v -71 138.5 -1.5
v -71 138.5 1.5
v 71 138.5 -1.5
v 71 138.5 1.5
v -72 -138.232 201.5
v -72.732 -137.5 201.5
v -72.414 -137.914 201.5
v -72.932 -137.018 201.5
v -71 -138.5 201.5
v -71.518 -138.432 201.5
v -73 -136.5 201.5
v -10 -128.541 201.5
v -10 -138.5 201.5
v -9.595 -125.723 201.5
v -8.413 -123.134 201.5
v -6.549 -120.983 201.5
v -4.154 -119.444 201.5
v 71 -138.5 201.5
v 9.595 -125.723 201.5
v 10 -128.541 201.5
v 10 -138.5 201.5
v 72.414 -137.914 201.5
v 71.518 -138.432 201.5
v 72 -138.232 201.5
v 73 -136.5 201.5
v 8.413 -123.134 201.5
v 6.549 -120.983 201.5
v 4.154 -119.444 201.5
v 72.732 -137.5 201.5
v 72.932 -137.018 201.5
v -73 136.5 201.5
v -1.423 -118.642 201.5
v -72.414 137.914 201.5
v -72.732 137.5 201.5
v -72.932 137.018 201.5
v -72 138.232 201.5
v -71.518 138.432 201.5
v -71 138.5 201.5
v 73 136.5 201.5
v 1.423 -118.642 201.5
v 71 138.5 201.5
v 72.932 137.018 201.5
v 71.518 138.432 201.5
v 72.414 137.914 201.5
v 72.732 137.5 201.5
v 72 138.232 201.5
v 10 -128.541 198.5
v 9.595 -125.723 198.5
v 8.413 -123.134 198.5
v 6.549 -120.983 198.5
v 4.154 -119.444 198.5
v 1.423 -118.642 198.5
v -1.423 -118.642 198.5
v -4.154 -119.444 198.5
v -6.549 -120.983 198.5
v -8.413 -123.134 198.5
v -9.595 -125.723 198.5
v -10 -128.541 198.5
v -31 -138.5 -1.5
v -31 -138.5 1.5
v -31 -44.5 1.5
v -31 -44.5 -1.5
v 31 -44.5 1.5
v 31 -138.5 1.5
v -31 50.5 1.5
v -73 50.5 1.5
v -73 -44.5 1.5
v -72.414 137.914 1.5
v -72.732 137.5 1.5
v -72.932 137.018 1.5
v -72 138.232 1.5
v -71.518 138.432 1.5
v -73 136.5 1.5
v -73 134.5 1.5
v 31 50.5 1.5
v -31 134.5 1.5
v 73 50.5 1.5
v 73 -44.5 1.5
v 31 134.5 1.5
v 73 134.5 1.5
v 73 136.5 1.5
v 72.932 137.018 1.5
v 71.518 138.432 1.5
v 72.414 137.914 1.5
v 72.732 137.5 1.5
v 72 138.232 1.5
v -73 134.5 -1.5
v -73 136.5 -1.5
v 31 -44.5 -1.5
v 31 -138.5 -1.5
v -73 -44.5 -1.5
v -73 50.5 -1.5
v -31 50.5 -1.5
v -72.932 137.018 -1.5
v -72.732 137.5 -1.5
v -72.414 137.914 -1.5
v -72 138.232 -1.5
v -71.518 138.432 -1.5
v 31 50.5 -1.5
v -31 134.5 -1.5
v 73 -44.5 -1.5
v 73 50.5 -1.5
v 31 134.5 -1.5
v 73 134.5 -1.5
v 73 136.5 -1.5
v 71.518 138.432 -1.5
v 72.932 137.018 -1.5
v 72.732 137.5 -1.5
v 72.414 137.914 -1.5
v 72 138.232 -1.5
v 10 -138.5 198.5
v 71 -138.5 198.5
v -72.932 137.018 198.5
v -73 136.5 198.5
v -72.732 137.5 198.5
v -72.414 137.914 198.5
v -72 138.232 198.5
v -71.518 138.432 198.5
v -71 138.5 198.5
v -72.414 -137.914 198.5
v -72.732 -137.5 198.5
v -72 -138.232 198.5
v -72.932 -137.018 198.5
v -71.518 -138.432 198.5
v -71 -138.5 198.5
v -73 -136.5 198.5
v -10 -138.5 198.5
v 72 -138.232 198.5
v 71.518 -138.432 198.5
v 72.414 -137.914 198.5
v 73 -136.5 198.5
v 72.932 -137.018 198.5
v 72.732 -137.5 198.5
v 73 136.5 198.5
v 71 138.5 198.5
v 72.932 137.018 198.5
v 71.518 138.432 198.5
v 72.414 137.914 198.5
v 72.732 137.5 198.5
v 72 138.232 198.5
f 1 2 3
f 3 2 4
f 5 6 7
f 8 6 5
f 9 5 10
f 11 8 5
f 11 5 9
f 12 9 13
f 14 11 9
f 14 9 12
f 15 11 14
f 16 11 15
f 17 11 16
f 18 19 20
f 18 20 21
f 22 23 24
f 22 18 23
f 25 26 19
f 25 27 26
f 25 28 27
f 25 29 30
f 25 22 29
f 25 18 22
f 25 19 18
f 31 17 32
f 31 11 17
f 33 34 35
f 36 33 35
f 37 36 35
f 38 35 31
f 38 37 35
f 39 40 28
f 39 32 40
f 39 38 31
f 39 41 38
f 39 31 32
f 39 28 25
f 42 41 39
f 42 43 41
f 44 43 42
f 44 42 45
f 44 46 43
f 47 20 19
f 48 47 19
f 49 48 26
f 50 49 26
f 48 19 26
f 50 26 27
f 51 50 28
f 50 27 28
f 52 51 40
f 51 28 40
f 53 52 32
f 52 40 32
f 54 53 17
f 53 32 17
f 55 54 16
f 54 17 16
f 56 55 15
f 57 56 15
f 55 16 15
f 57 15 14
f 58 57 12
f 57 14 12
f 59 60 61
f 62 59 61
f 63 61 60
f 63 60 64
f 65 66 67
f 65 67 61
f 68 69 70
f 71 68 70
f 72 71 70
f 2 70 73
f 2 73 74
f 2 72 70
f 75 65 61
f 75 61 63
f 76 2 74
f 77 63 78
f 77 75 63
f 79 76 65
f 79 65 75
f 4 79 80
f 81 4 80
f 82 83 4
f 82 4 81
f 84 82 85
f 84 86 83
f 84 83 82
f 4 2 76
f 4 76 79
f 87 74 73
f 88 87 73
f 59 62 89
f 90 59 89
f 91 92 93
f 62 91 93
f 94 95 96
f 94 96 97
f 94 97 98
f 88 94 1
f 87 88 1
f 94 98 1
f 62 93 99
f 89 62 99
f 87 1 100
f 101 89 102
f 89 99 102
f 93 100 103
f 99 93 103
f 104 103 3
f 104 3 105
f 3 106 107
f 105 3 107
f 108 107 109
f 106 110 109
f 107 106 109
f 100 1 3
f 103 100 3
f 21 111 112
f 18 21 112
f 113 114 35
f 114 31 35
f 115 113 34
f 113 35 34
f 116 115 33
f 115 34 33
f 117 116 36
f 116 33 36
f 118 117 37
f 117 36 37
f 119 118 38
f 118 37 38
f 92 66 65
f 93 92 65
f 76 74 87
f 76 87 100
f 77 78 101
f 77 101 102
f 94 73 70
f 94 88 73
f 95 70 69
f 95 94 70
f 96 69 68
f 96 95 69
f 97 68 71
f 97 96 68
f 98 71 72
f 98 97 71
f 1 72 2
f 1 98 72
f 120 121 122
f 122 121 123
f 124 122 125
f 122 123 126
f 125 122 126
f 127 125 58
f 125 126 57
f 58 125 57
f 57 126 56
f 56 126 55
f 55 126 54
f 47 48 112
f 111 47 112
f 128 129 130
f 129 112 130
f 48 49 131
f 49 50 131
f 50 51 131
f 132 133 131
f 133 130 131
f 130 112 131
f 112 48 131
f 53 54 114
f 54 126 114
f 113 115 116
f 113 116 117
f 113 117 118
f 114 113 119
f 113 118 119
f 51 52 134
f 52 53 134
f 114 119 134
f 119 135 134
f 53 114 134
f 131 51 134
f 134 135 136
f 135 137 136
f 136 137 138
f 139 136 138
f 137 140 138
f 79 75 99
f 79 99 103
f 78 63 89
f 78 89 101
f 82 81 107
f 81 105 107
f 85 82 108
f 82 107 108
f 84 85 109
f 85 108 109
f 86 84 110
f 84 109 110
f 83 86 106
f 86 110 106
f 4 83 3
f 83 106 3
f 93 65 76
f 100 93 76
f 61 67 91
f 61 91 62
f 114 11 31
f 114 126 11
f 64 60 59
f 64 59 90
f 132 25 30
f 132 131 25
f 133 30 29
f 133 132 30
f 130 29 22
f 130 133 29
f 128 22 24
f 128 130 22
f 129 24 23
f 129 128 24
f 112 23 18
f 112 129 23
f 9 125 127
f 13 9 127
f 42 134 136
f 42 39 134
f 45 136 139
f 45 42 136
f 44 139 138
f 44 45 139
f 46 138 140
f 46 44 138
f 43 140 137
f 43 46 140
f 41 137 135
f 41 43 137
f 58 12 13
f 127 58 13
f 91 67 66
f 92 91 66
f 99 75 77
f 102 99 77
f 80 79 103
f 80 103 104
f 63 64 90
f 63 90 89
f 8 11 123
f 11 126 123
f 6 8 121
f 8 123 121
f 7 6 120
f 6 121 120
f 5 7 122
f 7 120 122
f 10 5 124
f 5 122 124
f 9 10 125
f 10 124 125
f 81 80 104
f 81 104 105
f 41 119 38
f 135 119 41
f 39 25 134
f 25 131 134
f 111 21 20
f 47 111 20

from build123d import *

# Parameters (mm, degrees)
F0_W      = 146
F0_H      = 277
F1_DEPTH  = 1.5
F2_R      = 2
F4_R      = 7.5
F5_DEPTH  = 100
F6_T      = -1.5
F12_DEPTH = 8
F15_W     = 42
F15_H     = 94
F16_DEPTH = 6
F17_W     = 42
F17_H     = 84
F18_DEPTH = 6


with BuildPart() as f1:
    # F0 (on Top) → F1 (new body, symmetric)
    with BuildSketch(Plane.XY):
        Rectangle(F0_W, F0_H)
    extrude(amount=F1_DEPTH, both=True)

    # F2
    f2_edges = [f1.edges().sort_by_distance(p)[0] for p in [
        (-73, 138.5, 0),
        (73, 138.5, 0),
        (73, -138.5, 0),
        (-73, -138.5, 0),
    ]]
    fillet(f2_edges, radius=F2_R)


with BuildPart() as f5:
    # F4 (on face) → F5 (new body)
    with BuildSketch(Plane.XY.offset(1.5)):
        with Locations((0, -128.5)):
            Circle(F4_R)
    extrude(amount=-F5_DEPTH)

    # F6
    f6_openings = [f5.faces().sort_by_distance(p)[0] for p in [
        (0, -128.5, 1.5),
    ]]
    offset(amount=F6_T, openings=f6_openings)


with BuildPart() as f9_1:
    # F9: instance of F1
    add(f1.part.mirror(Plane.XY.offset(100)))

    # F11 (on face) → F12 (cut)
    with BuildSketch(Plane.XY.offset(201.5)):
        with BuildLine():
            Line((-10, -128.5405694683), (-10, -138.5405694683))
            Line((-10, -138.5405694683), (10, -138.5405694683))
            Line((10, -138.5405694683), (10, -128.5405694683))
            ThreePointArc((10, -128.5405694683), (0, -118.5405694683), (-10, -128.5405694683))
        make_face()
    extrude(amount=-F12_DEPTH, mode=Mode.SUBTRACT)


with BuildPart() as f1_1:
    add(f1.part)

    # F15 (on face) → F16 (cut)
    with BuildSketch(Plane.XY.offset(1.5)):
        with Locations((52, -91.5)):
            Rectangle(F15_W, F15_H)
        with Locations((-52, -91.5)):
            Rectangle(F15_W, F15_H)
    extrude(amount=-F16_DEPTH, mode=Mode.SUBTRACT)

    # F17 (on face) → F18 (cut)
    with BuildSketch(Plane.XY.offset(1.5)):
        with Locations((-52, 92.5)):
            Rectangle(F17_W, F17_H)
        with Locations((52, 92.5)):
            Rectangle(F17_W, F17_H)
    extrude(amount=-F18_DEPTH, mode=Mode.SUBTRACT)


solid = Compound([f9_1.part, f1_1.part])
